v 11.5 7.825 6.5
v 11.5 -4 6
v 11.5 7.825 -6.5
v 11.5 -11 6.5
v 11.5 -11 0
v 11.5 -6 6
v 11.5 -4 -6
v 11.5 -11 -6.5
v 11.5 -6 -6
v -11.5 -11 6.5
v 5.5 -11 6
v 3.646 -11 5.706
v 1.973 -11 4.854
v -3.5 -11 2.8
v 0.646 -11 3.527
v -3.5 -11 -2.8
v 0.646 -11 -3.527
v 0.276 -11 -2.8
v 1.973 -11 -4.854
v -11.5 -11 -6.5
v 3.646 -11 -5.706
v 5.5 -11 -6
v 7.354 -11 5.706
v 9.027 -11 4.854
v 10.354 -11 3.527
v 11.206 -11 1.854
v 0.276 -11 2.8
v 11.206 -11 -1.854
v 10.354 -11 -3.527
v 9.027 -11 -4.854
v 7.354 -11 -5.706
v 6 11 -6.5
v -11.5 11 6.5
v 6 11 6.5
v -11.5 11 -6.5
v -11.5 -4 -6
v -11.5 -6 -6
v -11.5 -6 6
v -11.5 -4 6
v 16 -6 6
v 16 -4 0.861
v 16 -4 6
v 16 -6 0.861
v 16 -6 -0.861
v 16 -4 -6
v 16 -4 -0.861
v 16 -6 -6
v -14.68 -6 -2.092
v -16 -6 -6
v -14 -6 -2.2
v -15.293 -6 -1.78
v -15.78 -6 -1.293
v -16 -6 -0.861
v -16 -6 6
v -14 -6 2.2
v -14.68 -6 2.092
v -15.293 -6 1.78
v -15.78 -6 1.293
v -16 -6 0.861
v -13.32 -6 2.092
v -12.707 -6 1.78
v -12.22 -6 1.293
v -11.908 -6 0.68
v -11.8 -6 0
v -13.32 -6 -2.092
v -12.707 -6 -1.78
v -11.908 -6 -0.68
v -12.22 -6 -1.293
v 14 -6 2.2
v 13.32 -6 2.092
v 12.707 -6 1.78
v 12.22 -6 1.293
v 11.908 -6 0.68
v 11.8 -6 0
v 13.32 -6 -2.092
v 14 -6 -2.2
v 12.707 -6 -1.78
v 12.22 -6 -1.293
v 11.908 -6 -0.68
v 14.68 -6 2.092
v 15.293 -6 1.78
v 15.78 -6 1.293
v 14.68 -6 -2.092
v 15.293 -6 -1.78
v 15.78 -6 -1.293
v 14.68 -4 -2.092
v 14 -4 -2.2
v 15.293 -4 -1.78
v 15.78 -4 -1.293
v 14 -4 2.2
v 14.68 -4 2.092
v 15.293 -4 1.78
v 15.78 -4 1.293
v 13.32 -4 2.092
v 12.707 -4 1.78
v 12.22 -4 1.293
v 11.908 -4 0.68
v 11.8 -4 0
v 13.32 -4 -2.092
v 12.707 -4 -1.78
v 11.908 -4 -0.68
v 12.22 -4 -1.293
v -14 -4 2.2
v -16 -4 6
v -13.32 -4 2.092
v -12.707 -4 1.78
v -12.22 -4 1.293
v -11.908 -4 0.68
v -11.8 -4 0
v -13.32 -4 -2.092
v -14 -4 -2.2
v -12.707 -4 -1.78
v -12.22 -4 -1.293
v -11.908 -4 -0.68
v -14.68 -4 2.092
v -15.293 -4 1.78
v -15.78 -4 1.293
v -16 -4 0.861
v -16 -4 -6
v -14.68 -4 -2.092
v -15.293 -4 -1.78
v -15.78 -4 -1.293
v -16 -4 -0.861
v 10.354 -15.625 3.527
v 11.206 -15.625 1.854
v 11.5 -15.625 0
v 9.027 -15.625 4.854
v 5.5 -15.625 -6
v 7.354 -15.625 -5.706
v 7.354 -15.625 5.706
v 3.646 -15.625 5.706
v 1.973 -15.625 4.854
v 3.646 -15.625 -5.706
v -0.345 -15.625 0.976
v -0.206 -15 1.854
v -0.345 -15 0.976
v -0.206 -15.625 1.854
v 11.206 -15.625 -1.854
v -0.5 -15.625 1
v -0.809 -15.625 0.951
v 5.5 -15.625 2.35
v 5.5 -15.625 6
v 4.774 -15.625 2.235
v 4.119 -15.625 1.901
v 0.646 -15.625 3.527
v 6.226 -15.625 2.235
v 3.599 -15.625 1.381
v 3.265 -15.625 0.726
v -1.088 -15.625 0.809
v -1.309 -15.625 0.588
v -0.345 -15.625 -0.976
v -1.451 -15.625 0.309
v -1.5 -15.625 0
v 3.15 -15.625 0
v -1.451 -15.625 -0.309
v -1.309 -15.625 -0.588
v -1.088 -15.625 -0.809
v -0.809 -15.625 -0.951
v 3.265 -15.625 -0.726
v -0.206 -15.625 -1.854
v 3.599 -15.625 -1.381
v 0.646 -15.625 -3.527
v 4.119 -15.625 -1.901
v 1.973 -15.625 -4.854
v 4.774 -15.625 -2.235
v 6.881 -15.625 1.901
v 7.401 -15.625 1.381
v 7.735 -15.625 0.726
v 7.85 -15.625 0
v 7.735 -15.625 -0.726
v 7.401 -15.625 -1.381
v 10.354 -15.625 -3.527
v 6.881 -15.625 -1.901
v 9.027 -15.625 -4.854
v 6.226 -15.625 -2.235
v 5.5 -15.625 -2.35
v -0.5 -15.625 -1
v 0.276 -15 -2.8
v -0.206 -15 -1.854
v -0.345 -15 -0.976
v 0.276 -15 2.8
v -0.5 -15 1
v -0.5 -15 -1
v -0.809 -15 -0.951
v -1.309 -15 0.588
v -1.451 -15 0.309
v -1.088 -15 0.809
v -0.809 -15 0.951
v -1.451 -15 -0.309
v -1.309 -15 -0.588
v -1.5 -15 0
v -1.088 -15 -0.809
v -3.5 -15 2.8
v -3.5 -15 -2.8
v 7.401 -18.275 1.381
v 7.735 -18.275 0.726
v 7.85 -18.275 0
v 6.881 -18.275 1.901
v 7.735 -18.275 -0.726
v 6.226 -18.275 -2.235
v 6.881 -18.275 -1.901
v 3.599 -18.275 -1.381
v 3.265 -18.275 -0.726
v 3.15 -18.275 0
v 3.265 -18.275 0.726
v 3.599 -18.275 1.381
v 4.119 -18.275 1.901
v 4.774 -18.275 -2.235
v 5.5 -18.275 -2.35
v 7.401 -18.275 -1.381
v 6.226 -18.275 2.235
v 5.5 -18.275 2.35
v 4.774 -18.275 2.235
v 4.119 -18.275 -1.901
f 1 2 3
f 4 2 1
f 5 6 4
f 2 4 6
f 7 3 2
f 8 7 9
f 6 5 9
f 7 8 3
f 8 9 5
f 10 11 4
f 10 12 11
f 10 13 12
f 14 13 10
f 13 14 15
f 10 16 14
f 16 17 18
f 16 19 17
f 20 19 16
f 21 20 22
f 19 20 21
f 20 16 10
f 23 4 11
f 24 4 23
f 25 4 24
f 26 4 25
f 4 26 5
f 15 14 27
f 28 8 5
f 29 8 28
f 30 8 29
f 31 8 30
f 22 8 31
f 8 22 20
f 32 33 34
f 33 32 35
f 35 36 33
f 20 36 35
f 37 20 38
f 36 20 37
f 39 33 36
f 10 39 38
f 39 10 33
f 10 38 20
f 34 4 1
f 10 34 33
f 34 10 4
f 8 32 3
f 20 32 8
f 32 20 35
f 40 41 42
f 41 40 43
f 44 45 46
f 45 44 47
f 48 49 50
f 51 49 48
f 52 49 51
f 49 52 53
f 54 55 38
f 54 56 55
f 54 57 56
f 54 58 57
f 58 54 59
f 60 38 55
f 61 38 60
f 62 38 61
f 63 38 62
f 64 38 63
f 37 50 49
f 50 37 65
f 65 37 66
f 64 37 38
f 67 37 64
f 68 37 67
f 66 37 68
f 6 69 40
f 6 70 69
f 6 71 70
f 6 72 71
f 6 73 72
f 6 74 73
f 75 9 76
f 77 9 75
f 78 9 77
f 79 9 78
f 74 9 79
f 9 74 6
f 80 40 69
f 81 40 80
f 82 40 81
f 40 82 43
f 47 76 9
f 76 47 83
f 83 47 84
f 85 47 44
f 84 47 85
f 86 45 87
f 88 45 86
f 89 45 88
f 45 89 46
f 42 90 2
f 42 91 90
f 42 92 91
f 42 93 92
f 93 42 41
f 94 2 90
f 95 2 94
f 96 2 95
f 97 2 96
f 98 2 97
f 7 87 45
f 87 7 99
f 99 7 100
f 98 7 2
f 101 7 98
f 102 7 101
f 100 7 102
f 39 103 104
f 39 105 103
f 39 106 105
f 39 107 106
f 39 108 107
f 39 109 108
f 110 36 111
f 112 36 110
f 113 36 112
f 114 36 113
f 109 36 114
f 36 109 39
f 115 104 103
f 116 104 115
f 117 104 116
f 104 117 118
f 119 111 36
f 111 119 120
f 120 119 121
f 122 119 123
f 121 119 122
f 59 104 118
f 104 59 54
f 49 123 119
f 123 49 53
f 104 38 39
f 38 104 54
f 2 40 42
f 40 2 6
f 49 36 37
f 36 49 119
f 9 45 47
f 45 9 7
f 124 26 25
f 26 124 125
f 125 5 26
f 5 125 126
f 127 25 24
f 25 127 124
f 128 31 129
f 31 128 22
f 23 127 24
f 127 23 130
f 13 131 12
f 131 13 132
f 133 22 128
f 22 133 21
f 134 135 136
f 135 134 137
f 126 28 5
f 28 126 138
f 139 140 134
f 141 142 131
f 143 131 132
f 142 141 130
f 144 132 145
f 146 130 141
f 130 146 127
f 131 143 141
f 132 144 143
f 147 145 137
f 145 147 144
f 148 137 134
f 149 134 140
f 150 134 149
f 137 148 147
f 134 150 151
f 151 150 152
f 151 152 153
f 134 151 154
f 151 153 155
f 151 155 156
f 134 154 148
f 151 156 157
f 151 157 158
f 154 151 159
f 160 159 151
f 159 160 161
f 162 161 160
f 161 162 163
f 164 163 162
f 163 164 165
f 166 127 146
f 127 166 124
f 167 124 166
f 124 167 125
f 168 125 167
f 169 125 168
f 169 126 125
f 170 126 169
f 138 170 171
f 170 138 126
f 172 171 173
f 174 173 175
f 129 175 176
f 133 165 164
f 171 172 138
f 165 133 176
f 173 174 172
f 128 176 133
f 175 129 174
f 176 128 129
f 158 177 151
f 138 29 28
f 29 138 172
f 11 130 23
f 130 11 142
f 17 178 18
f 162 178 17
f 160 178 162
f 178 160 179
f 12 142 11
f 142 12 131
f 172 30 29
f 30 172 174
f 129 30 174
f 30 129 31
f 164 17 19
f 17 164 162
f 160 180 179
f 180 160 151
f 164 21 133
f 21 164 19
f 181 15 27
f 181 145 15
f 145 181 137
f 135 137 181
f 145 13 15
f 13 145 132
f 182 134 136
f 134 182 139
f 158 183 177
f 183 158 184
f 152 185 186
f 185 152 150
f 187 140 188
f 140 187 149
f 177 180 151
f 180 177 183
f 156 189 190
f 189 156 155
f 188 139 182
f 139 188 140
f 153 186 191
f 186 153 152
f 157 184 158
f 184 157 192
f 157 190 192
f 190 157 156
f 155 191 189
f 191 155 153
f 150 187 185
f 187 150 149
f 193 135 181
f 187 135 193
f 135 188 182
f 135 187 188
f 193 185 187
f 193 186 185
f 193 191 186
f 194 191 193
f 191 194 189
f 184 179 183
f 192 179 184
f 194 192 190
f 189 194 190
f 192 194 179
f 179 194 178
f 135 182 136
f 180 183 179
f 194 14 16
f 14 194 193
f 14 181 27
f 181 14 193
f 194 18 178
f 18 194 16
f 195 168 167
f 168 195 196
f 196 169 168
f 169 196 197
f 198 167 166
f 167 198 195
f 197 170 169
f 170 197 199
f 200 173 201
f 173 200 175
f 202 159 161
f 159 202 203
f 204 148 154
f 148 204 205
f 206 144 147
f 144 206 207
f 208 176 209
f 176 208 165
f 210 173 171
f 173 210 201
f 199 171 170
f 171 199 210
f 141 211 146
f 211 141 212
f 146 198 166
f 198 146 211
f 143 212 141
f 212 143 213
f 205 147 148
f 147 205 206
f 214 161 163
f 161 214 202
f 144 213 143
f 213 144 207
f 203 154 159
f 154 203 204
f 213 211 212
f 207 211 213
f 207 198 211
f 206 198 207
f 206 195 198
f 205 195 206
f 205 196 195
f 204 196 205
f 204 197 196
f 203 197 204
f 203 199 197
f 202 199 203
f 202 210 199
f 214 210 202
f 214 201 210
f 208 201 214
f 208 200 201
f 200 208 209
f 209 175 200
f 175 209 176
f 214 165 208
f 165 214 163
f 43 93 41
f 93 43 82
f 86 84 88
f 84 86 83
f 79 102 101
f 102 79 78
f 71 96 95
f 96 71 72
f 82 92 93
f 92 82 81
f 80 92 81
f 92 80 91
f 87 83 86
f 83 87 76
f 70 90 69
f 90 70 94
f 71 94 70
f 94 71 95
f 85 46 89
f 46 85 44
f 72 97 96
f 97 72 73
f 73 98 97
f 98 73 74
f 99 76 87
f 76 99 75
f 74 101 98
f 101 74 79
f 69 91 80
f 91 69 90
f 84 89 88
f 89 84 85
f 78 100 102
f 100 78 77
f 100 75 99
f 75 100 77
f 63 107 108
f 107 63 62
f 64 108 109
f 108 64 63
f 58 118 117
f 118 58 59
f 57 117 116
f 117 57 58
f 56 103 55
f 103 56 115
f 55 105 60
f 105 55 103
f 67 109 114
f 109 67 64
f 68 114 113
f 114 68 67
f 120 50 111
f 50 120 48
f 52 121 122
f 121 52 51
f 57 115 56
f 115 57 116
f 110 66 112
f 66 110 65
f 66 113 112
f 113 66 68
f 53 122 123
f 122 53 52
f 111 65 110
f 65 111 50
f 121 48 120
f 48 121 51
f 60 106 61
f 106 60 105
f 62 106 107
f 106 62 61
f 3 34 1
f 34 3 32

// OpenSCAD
module 9g_motor(){
    rotate([90,0,0]){
        difference(){			
            union(){
                color("steel blue") cube([23,13,22], center=true);
                color("steel blue") translate([0,0,5]) cube([32,12,2], center=true);
                color("steel blue") translate([5.5,0,2.75]) cylinder(r=6, h=25.75, $fn=20, center=true);
                color("steel blue") translate([-.5,0,2.75]) cylinder(r=1, h=25.75, $fn=20, center=true);
                color("steel blue") translate([-1,0,2.75]) cube([5,5.6,24.5], center=true);		
                color("white") translate([5.5,0,3.65]) cylinder(r=2.35, h=29.25, $fn=20, center=true);				
            }
            translate([10,0,-11]) rotate([0,-30,0]) cube([8,13,4], center=true);
            for ( hole = [14,-14] ){
                translate([hole,0,5]) cylinder(r=2.2, h=4, $fn=20, center=true);
            }	
        }
    }
}

9g_motor();
